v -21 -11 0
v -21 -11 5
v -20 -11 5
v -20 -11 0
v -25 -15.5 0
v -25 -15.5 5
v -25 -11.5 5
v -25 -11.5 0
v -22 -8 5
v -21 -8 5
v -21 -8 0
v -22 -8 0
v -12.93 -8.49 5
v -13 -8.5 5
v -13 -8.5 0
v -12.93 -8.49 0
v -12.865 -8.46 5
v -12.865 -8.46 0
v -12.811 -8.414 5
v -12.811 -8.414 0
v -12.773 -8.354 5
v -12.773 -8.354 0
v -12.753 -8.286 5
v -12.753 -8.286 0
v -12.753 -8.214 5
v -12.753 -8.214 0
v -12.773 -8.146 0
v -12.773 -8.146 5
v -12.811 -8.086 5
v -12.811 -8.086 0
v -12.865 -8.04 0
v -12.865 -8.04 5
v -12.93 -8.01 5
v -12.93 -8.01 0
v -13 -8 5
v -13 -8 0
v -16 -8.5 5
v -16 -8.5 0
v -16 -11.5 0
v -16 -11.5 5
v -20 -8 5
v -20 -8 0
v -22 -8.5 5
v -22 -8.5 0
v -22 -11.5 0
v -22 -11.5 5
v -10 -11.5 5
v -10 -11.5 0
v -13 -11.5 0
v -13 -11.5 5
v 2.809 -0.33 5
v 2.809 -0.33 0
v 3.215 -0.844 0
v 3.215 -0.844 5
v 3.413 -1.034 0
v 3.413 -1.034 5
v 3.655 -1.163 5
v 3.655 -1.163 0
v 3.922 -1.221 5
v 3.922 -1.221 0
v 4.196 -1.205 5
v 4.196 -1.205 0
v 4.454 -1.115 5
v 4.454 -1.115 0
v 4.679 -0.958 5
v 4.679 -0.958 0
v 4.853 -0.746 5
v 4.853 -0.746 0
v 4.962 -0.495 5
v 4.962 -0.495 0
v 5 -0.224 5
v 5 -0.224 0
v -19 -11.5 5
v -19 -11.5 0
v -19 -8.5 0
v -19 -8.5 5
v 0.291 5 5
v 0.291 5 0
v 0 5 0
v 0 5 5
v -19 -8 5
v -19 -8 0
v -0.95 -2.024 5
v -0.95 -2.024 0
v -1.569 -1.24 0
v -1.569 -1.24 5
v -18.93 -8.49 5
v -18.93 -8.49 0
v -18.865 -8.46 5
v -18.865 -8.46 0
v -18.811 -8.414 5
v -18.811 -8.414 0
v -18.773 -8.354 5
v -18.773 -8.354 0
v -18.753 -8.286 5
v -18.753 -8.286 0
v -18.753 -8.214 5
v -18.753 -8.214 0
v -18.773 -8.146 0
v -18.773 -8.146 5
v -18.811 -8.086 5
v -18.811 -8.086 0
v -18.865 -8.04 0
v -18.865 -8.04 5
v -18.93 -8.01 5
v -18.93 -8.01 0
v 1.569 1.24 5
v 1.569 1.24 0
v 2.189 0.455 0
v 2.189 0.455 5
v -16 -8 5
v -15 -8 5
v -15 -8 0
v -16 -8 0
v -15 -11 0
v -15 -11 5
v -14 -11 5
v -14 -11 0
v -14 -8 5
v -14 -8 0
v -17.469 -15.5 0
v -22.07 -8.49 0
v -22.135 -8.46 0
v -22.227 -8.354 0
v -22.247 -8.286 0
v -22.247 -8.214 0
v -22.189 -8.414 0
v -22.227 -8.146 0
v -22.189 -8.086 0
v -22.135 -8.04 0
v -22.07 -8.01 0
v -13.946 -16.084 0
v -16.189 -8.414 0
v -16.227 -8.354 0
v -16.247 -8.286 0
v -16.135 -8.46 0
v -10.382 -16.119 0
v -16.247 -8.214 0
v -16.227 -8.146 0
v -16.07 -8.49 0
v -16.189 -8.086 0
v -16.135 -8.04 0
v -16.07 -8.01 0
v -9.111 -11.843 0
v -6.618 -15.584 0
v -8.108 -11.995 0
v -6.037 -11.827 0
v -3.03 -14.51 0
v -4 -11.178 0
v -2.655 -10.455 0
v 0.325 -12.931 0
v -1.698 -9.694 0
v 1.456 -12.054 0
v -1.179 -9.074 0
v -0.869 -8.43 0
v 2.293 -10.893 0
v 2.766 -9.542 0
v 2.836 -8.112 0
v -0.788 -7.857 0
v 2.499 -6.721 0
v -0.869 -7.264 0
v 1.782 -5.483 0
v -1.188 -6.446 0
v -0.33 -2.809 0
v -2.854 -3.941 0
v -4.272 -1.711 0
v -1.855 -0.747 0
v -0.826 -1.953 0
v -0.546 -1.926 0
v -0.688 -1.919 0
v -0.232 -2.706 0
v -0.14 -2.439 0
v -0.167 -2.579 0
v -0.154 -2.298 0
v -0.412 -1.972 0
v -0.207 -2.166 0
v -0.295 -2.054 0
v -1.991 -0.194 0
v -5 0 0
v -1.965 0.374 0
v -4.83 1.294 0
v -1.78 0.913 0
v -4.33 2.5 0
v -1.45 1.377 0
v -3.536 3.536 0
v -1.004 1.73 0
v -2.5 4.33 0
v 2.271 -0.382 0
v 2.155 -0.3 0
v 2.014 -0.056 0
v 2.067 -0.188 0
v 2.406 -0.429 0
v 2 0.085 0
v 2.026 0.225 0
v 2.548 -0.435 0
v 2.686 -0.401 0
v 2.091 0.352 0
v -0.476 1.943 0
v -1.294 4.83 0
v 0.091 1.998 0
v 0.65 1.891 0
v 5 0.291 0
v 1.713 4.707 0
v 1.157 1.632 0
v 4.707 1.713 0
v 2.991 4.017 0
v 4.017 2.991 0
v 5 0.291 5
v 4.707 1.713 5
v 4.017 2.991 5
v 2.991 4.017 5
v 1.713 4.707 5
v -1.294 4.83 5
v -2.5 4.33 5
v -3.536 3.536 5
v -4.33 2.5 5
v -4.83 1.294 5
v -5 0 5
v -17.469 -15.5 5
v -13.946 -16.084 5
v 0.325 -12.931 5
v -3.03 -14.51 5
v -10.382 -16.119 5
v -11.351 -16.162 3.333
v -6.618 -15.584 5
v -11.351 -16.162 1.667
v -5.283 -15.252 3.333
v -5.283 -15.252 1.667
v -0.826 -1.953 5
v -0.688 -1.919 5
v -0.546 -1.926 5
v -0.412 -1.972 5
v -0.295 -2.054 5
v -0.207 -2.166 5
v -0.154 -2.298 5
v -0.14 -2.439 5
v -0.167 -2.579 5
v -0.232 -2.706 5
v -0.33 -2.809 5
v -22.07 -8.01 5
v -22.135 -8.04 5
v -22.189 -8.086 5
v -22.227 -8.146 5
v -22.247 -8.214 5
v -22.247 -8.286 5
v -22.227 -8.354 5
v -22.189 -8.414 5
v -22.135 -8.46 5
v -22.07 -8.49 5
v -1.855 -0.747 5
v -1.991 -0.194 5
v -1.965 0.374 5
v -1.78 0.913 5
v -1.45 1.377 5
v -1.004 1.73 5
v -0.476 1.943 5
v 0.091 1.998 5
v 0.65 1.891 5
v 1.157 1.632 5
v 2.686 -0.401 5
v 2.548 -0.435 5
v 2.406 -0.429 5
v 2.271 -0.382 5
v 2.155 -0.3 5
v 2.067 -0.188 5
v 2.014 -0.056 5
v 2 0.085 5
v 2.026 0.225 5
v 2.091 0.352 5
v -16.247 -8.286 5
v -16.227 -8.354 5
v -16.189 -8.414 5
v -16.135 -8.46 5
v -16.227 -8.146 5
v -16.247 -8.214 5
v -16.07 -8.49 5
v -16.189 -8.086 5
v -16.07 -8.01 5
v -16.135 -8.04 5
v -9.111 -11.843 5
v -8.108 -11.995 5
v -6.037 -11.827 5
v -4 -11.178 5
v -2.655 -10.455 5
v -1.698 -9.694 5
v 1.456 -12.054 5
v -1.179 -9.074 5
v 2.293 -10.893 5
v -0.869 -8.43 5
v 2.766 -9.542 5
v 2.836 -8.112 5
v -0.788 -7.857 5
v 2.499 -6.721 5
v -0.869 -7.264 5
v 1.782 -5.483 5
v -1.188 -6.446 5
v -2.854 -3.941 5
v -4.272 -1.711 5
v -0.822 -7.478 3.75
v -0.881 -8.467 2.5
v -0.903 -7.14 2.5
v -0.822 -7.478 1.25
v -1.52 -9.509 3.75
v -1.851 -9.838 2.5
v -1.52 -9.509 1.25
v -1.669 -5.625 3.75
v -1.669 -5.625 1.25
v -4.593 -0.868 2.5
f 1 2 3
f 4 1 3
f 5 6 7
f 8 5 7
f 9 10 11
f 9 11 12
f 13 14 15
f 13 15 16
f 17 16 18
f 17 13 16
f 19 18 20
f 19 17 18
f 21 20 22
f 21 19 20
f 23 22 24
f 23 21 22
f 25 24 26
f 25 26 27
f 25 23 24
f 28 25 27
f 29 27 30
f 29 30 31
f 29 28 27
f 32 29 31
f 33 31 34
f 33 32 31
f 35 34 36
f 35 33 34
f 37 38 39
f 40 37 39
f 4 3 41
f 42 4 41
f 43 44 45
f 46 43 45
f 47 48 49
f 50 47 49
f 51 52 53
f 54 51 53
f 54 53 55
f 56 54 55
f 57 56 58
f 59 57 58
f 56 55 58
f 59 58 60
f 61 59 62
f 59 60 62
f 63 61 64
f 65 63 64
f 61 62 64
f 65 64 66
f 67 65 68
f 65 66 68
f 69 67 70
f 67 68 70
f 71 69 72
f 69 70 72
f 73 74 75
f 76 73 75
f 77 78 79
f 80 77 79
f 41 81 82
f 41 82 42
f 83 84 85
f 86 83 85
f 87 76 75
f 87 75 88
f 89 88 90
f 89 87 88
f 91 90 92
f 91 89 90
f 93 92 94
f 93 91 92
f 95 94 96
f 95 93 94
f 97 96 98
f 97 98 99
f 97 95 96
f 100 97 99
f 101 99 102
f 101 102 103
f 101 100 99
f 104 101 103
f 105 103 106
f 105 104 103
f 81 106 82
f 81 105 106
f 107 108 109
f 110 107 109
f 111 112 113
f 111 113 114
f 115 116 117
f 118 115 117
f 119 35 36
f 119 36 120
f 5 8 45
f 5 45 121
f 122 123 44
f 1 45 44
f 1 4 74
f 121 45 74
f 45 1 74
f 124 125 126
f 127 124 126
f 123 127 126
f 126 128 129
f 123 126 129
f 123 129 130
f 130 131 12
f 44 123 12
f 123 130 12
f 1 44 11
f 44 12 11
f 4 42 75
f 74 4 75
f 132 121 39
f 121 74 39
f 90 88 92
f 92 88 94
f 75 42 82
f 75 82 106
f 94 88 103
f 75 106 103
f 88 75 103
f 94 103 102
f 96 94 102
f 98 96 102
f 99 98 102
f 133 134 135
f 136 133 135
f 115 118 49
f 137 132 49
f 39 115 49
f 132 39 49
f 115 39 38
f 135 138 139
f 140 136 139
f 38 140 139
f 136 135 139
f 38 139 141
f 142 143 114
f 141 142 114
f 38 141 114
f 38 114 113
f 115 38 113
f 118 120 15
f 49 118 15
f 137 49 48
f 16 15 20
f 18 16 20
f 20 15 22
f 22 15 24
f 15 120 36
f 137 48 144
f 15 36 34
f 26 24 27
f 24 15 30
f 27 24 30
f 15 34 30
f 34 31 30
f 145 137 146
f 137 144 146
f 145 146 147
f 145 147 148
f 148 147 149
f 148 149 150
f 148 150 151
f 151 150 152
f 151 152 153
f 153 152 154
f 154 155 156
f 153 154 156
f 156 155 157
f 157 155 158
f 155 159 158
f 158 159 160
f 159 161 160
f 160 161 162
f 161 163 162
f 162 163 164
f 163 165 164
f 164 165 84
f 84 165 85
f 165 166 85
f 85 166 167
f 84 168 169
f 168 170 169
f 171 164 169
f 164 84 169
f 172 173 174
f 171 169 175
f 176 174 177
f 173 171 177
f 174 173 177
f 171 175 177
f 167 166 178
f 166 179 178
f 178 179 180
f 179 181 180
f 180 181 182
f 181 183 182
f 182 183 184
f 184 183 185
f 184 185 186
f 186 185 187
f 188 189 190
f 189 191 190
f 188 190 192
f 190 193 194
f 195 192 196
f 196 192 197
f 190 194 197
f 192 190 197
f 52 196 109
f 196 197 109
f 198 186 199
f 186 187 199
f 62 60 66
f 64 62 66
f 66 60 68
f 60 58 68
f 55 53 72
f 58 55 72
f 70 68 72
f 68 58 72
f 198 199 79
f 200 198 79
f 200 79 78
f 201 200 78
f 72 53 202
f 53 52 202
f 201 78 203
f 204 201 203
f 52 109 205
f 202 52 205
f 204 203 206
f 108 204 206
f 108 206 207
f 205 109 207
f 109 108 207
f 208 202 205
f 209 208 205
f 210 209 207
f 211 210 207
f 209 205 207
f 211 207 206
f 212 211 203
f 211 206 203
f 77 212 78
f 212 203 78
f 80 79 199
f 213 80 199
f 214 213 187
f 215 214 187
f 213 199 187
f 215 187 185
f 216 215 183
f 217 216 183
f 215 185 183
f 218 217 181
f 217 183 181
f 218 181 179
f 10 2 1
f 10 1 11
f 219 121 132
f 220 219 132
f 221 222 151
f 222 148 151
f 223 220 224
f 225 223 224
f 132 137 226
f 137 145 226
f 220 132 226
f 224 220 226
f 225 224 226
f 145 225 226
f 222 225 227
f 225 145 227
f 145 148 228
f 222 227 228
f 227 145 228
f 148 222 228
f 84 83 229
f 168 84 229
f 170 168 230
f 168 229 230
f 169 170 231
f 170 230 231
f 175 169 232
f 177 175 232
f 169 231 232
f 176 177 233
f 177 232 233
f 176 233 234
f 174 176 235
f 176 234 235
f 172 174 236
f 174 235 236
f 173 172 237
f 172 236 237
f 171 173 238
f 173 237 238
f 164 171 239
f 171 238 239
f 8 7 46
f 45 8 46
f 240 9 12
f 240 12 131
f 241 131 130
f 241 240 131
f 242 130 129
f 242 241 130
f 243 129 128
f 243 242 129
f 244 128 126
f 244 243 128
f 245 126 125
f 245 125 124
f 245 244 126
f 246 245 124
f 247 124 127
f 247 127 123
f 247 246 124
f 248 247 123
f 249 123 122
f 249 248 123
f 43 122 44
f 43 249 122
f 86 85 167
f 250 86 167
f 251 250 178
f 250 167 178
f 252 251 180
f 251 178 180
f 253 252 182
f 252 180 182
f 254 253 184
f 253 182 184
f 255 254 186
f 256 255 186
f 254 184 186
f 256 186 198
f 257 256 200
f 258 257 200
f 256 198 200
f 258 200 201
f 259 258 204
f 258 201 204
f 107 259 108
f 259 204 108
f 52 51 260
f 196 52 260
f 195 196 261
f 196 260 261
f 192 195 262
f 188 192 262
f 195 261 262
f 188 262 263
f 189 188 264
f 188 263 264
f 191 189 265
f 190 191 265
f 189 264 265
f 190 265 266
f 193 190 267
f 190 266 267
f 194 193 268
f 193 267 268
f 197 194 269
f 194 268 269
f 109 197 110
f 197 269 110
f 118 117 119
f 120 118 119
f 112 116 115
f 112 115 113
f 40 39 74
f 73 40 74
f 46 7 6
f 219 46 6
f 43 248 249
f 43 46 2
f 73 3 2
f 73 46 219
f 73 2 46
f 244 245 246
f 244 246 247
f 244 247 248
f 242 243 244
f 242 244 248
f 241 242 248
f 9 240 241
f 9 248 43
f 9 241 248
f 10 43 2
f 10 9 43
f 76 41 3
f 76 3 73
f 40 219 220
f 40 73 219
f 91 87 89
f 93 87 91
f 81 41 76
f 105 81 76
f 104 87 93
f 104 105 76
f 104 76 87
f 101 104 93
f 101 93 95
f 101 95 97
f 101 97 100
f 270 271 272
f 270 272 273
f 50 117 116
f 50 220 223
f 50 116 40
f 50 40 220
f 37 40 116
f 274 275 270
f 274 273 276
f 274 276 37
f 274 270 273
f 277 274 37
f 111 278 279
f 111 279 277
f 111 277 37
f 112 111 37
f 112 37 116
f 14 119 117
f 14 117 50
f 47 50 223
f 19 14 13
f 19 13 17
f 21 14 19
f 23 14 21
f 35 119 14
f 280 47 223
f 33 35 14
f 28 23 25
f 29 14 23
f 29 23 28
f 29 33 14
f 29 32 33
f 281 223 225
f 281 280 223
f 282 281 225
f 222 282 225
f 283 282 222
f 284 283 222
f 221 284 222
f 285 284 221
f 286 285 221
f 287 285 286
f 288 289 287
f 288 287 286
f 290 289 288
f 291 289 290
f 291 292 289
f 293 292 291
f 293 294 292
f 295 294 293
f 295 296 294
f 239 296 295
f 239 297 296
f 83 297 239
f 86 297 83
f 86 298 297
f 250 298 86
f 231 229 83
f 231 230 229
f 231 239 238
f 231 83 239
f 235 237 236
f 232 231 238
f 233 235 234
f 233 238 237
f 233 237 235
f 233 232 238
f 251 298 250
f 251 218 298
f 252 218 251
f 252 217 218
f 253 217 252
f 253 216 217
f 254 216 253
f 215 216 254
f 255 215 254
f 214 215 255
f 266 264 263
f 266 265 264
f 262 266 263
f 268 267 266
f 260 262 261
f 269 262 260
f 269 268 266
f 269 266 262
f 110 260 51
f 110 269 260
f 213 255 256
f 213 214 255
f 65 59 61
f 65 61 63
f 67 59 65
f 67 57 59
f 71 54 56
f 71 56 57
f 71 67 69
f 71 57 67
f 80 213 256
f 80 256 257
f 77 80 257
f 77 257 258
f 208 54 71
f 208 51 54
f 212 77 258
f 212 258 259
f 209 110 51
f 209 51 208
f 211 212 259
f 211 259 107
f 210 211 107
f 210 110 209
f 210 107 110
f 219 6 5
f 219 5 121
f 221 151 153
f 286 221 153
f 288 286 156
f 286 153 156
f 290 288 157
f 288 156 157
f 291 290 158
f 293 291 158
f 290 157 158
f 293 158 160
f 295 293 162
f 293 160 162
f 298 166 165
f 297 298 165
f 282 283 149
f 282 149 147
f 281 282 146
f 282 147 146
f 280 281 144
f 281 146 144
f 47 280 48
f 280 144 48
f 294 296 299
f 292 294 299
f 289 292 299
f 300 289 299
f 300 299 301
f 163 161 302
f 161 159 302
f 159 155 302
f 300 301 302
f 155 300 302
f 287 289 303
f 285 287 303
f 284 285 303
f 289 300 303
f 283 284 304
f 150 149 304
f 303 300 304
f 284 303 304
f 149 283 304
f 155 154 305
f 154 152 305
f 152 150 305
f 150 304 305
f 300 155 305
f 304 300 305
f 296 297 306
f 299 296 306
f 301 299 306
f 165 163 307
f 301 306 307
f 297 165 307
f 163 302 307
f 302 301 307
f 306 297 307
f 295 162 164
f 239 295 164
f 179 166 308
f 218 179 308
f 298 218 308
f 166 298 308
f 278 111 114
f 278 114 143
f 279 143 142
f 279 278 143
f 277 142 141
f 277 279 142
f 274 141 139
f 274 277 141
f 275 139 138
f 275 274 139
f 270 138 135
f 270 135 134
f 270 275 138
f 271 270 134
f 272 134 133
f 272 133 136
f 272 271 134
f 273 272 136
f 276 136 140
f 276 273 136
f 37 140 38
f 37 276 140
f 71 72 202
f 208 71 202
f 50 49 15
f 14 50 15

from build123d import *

# Parameters (mm, degrees)
BOSS_EXTRUDE1_DEPTH = 5
BOSS_EXTRUDE2_DEPTH = 5
CUT_EXTRUDE3_START  = -5
CUT_EXTRUDE3_DEPTH  = 5
SKETCH4_W           = 3
SKETCH4_H           = 4
BOSS_EXTRUDE3_DEPTH = 5
SKETCH5_W           = 1
SKETCH5_H           = 3
CUT_EXTRUDE4_DEPTH  = 5


# Read off the part's stored shape, not the designer's step: Cut-Extrude3
with BuildPart() as part:
    # Sketch1 → Boss-Extrude1 (new body)
    with BuildSketch(Plane.XY):
        with BuildLine():
            add(Edge.make_bspline(
                [(-5, 0), (-1.114165851, -7.611100797), (-10, -11.5)],
                knots=[0, 0, 0, 1, 1, 1], degree=2))
            Line((-10, -11.5), (-13, -11.5))
            Line((-13, -11.5), (-13, -8.5))
            Line((-13, -8.5), (-16, -8.5))
            Line((-16, -8.5), (-16, -11.5))
            Line((-16, -11.5), (-19, -11.5))
            Line((-19, -11.5), (-19, -8.5))
            Line((-19, -8.5), (-22, -8.5))
            Line((-22, -8.5), (-22, -15.5))
            Line((-22, -15.5), (-17.468951593, -15.5))
            add(Edge.make_bspline(
                [(-17.468951593, -15.5), (-11.464221473, -17.002032437), (-4.91520191, -15.903447496), (0.325280881, -12.931109156)],
                knots=[0.25236579, 0.25236579, 0.25236579, 0.25236579, 1.015713885, 1.015713885, 1.015713885, 1.015713885], degree=3))
            ThreePointArc((0.325280881, -12.931109156), (2.765522994, -9.541735665), (1.782110459, -5.482729135))
            Line((1.782110459, -5.482729135), (-1.569443242, -1.2396967))
            ThreePointArc((-1.569443242, -1.2396967), (-1.2396967, 1.569443242), (1.569443242, 1.2396967))
            Line((1.569443242, 1.2396967), (3.215278379, -0.843913615))
            ThreePointArc((3.215278379, -0.843913615), (4.328084119, -1.168713777), (5, -0.224065265))
            Line((5, -0.224065265), (5, 0.290683459))
            ThreePointArc((5, 0.290683459), (3.541503697, 3.541503697), (0.290683459, 5))
            Line((0.290683459, 5), (0, 5))
            ThreePointArc((0, 5), (-3.535533906, 3.535533906), (-5, 0))
        make_face()
    extrude(amount=BOSS_EXTRUDE1_DEPTH)

    # Sketch2 → Boss-Extrude2 (add)
    with BuildSketch(Plane.XY.offset(5)):
        with BuildLine():
            Line((2.189291593, 0.454975079), (2.809139943, -0.329746542))
            ThreePointArc((2.809139943, -0.329746542), (2.106854957, -0.247309907), (2.189291593, 0.454975079))
        make_face()
        with BuildLine():
            Line((-0.329746542, -2.809139943), (-0.949594892, -2.024418322))
            ThreePointArc((-0.949594892, -2.024418322), (-0.247309907, -2.106854957), (-0.329746542, -2.809139943))
        make_face()
    extrude(amount=-BOSS_EXTRUDE2_DEPTH)

    # Cut-Extrude3 outline → Cut-Extrude3 (cut)
    with BuildSketch(Plane.XY.offset(5).offset(CUT_EXTRUDE3_START)):
        with BuildLine():
            add(Edge.make_bspline(
                [(-4.271989908, -1.710772943), (-2.750457375, -4.583809325), (2.811238363, -9.068198313), (-7.188128971, -13.02856833), (-10, -11.5)],
                knots=[0.076818774, 0.076818774, 0.076818774, 0.076818774, 0.487236237, 1, 1, 1, 1], degree=3))
            add(Edge.make_bspline(
                [(-4.271989908, -1.710772943), (-2.141880314, -8.060881638), (-10, -11.5)],
                knots=[0.115657624, 0.115657624, 0.115657624, 1, 1, 1], degree=2))
        make_face()
    extrude(amount=CUT_EXTRUDE3_DEPTH, mode=Mode.SUBTRACT)

    # Sketch4 → Boss-Extrude3 (add)
    with BuildSketch(Plane.XY.offset(5)):
        with Locations((-23.5, -13.5)):
            Rectangle(SKETCH4_W, SKETCH4_H)
        with BuildLine():
            Line((-22, -8.5), (-19, -8.5))
            ThreePointArc((-19, -8.5), (-18.75, -8.25), (-19, -8))
            Line((-19, -8), (-22, -8))
            ThreePointArc((-22, -8), (-22.25, -8.25), (-22, -8.5))
        make_face()
        with BuildLine():
            Line((-16, -8.5), (-13, -8.5))
            ThreePointArc((-13, -8.5), (-12.75, -8.25), (-13, -8))
            Line((-13, -8), (-16, -8))
            ThreePointArc((-16, -8), (-16.25, -8.25), (-16, -8.5))
        make_face()
    extrude(amount=-BOSS_EXTRUDE3_DEPTH)

    # Sketch5 → Cut-Extrude4 (cut)
    with BuildSketch(Plane.XY.offset(5)):
        with Locations((-20.5, -9.5)):
            Rectangle(SKETCH5_W, SKETCH5_H)
        with Locations((-14.5, -9.5)):
            Rectangle(SKETCH5_W, SKETCH5_H)
    extrude(amount=-CUT_EXTRUDE4_DEPTH, mode=Mode.SUBTRACT)


solid = part.part
